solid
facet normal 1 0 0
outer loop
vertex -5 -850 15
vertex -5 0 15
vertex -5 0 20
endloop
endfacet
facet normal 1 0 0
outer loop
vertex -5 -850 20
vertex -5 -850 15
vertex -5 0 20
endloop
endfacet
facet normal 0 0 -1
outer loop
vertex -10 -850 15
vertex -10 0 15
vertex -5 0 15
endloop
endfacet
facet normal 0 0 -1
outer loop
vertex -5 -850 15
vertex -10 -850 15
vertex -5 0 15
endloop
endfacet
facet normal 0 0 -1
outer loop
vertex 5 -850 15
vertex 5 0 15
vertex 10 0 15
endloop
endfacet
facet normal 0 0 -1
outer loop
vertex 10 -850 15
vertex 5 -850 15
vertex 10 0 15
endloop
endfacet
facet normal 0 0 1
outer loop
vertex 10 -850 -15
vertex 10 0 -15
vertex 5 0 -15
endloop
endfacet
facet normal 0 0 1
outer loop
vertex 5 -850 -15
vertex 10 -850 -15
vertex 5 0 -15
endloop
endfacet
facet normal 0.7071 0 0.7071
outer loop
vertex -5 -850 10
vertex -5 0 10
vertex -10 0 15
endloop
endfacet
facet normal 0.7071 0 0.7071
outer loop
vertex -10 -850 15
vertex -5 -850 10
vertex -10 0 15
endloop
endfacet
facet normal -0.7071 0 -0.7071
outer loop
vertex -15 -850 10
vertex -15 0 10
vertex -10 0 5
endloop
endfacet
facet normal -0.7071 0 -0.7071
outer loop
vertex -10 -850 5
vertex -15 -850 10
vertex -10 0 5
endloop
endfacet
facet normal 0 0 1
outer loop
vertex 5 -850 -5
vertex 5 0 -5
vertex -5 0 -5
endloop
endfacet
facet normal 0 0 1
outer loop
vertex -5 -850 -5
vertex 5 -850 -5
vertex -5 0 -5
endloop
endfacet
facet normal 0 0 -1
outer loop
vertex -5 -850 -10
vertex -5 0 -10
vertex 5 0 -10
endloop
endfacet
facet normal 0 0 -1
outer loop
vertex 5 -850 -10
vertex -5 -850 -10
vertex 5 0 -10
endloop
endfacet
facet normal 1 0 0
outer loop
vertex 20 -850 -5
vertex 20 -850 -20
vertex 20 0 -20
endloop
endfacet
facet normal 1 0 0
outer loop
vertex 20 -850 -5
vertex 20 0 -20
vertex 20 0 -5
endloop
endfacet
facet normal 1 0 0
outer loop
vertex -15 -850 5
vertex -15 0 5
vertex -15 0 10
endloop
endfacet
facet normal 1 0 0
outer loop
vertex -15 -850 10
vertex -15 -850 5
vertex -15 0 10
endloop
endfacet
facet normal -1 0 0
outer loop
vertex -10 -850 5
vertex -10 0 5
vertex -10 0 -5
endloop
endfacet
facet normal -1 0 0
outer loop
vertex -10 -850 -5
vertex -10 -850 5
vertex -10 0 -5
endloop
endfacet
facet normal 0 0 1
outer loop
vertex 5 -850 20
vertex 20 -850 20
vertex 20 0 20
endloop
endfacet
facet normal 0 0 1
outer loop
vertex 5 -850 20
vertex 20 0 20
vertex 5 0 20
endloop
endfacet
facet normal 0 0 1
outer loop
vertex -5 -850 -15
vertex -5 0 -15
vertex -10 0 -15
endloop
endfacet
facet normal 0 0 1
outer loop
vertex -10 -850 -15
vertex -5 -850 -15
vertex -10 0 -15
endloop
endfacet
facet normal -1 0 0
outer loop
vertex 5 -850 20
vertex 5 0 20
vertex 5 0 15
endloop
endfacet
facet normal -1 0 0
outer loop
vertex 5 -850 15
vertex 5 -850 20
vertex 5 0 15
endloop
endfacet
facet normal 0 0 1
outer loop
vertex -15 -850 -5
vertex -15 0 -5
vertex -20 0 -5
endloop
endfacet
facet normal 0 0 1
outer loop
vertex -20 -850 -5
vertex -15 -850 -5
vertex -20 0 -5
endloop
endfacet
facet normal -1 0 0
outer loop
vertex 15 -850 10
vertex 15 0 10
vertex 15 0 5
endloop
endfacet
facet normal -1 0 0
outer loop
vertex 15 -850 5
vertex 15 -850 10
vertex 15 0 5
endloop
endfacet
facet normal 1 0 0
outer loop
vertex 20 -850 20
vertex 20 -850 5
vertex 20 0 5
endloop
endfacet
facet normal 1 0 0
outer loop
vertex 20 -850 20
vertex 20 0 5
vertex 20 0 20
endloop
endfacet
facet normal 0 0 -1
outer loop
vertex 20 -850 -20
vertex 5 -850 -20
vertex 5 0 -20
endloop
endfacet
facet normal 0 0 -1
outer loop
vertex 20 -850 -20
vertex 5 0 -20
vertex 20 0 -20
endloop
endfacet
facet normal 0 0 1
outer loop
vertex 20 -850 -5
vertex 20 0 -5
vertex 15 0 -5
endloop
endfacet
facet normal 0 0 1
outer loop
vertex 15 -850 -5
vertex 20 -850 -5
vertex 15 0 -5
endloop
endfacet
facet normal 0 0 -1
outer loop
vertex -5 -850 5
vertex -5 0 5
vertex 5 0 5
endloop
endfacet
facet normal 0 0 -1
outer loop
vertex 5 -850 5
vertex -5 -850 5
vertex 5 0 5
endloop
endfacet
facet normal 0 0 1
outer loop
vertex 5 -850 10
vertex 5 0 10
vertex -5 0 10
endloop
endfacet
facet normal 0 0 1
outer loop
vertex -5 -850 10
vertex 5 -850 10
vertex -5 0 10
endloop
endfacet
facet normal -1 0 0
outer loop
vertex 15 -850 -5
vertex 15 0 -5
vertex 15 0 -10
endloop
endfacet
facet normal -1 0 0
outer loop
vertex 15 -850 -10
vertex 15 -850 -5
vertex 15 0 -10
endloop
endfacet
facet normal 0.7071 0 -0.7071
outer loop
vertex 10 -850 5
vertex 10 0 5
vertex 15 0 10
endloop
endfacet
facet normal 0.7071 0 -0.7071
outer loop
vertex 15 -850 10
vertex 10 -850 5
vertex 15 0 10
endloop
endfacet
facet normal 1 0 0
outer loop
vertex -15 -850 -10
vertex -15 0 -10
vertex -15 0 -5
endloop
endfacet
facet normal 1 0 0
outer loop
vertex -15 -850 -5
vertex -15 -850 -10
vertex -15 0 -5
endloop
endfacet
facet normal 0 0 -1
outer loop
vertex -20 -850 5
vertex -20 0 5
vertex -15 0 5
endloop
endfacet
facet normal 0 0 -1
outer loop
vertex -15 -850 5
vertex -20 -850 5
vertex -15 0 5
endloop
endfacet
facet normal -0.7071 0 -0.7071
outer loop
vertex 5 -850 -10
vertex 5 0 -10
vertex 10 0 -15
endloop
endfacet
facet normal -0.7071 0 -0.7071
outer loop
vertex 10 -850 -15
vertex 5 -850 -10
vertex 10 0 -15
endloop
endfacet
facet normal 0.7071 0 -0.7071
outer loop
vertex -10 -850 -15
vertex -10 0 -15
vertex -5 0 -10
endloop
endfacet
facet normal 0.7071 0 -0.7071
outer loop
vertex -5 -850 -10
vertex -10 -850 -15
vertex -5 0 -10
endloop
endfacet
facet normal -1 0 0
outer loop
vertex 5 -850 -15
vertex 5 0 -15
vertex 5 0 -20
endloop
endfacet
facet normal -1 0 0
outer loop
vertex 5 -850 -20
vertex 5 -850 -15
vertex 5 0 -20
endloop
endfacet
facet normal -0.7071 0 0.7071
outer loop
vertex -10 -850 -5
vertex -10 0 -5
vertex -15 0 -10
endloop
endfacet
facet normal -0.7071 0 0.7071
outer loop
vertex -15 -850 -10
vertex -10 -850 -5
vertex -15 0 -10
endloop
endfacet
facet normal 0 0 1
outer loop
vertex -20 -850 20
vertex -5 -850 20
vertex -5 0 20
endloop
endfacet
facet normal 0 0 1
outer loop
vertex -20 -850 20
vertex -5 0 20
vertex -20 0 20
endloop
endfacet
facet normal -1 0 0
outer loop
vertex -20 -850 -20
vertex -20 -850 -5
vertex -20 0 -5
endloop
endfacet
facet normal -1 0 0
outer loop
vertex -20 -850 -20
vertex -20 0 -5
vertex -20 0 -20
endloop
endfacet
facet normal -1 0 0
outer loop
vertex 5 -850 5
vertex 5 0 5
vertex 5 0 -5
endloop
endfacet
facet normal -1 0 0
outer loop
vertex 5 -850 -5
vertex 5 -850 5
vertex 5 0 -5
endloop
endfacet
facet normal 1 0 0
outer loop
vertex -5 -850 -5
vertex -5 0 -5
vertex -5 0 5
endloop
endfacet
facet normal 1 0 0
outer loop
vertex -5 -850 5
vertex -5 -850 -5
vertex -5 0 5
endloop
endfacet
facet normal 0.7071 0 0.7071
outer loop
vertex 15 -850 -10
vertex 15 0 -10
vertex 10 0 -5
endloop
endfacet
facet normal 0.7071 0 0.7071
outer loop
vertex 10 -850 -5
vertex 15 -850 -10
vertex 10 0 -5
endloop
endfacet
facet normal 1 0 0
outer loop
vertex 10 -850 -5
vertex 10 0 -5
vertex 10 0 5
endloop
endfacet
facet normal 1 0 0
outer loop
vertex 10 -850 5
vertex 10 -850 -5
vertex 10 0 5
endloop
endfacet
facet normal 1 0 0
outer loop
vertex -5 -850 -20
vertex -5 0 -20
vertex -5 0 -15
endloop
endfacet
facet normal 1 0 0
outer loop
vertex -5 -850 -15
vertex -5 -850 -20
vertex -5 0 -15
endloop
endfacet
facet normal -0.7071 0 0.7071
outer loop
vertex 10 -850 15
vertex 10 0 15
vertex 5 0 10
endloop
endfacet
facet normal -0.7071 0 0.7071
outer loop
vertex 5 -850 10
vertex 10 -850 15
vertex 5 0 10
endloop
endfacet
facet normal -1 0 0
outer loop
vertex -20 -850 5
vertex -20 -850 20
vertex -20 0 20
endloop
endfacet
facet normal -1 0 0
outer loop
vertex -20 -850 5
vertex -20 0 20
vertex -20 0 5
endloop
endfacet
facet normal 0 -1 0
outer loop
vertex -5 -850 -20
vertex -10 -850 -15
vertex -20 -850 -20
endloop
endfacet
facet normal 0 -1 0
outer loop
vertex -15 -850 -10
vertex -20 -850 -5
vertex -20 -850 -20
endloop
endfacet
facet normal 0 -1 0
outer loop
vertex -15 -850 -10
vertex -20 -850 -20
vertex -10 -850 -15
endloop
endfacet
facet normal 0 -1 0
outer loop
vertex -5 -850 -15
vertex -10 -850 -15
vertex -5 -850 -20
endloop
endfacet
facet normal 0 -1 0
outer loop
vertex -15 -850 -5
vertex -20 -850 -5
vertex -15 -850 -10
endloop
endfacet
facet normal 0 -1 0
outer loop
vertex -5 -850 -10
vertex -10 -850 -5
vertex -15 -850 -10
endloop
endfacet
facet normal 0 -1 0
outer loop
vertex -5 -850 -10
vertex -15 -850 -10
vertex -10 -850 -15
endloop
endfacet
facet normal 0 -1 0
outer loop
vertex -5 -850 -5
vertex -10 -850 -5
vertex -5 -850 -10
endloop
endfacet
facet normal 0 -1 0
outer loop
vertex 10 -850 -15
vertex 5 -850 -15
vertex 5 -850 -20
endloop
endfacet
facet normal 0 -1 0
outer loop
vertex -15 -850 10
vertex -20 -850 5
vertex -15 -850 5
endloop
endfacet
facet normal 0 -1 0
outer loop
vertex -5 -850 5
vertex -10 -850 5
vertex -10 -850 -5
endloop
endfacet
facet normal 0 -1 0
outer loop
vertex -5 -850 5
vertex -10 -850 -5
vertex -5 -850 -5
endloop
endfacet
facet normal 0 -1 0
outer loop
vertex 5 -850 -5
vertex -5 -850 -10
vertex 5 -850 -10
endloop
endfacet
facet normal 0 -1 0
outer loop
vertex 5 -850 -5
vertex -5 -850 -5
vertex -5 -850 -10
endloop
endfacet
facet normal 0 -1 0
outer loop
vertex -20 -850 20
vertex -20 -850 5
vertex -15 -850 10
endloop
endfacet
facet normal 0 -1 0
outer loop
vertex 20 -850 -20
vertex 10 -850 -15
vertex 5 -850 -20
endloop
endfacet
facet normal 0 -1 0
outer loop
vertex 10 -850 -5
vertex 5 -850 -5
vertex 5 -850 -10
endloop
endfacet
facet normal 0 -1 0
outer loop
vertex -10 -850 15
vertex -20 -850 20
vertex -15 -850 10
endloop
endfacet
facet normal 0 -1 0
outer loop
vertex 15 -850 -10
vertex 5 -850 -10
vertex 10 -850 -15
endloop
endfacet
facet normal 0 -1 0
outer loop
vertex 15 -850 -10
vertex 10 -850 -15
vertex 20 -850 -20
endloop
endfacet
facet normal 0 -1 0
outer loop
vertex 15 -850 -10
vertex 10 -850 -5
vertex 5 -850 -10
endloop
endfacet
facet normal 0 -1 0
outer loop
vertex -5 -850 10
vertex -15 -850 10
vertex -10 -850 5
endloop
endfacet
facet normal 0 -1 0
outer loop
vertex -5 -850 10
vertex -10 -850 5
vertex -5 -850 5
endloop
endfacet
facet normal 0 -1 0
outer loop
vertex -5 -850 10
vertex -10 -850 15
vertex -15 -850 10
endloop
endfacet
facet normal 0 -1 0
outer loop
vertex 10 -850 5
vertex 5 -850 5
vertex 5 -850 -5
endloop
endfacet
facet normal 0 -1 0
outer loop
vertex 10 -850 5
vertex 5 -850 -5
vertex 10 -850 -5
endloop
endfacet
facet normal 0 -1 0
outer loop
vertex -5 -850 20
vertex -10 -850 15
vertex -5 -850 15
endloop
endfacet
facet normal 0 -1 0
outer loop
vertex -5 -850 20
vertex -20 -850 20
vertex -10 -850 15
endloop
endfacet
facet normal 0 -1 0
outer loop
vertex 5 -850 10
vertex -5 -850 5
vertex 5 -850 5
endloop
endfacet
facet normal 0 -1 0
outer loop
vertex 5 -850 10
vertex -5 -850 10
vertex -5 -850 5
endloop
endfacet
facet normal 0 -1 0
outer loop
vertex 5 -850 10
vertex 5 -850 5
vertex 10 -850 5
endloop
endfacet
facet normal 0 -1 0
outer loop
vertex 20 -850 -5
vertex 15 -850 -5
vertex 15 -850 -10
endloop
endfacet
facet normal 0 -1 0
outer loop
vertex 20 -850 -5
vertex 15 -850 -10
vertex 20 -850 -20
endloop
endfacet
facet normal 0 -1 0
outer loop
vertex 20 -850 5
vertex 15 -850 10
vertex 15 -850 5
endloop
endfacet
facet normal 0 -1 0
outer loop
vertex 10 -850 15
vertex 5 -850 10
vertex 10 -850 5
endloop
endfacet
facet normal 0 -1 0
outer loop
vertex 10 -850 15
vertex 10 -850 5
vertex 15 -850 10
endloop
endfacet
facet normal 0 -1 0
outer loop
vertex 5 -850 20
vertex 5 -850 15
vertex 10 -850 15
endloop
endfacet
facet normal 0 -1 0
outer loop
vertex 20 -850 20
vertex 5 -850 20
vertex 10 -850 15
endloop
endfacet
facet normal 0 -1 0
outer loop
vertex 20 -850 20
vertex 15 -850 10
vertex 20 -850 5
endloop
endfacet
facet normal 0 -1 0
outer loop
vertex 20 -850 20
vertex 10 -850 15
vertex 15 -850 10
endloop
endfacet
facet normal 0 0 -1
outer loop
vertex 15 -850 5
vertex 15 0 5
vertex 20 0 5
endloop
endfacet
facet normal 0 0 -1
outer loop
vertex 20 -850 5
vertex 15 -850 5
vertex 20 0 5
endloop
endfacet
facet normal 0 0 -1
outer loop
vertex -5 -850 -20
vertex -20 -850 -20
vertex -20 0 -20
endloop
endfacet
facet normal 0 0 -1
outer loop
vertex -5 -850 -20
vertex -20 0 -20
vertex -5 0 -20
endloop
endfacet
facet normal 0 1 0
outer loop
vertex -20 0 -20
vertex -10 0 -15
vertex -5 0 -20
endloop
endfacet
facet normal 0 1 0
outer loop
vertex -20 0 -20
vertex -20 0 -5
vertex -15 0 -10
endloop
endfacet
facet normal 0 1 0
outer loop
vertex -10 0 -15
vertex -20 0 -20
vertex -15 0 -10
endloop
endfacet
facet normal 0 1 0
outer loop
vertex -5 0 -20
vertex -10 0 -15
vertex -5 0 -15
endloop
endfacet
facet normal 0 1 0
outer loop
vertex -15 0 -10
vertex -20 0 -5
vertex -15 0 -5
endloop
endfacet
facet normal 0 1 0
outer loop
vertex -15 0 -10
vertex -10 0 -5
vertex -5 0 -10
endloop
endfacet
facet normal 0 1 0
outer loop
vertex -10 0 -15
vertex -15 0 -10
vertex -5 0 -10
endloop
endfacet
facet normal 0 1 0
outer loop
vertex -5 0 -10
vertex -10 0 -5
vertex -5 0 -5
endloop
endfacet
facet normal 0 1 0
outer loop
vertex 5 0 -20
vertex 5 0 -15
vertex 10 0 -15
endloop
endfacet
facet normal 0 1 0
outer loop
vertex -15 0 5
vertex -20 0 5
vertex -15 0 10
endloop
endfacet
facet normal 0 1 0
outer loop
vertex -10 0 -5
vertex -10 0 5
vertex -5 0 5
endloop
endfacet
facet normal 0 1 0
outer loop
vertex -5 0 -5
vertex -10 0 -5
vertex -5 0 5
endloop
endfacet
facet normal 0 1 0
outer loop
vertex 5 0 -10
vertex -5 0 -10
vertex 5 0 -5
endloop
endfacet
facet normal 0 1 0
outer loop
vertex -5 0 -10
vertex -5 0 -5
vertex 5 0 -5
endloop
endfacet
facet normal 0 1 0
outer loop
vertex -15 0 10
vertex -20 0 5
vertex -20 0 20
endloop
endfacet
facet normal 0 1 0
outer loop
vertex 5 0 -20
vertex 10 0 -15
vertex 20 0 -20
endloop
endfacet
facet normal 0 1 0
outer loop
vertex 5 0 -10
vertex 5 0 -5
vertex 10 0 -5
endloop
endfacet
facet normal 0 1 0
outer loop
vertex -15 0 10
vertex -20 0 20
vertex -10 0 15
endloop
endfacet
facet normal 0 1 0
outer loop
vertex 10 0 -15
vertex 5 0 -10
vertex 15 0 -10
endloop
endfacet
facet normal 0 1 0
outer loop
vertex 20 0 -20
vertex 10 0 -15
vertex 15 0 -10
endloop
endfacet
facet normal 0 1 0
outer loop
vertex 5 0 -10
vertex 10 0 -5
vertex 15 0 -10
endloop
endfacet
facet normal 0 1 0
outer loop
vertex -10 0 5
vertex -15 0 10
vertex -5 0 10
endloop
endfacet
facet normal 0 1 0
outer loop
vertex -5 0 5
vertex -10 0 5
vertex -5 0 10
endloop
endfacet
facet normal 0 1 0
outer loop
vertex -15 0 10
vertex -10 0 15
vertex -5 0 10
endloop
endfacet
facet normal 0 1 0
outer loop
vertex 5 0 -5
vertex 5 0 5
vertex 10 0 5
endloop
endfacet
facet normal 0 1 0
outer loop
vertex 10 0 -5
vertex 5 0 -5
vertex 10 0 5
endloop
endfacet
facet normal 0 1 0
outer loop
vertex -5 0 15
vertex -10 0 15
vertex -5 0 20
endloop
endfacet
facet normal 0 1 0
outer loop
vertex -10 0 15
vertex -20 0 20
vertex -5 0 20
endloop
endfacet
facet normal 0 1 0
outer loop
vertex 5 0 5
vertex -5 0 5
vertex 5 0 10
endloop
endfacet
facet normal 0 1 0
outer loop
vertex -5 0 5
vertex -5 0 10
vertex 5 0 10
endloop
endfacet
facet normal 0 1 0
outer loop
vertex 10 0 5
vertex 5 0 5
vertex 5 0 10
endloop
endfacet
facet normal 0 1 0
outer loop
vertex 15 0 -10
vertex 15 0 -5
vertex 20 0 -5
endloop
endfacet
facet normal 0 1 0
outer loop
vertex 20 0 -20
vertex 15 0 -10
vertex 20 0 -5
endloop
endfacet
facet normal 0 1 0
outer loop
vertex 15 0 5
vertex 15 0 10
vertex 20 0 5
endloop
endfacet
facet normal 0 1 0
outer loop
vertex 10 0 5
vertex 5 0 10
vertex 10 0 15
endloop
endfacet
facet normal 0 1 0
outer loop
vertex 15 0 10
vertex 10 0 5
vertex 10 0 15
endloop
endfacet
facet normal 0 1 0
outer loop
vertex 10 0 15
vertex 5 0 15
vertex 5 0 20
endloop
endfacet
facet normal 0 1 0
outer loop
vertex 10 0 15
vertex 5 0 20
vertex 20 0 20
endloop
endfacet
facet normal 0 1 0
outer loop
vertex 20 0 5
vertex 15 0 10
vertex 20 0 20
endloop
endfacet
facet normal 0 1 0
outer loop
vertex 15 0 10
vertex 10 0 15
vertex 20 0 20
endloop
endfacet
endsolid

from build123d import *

# Parameters (mm, degrees)
F1_DEPTH = 850


with BuildPart() as f1:
    # F0 (on Front) → F1 (new body)
    with BuildSketch(Plane.XZ):
        Polygon((20, 5), (20, 20), (5, 20), (5, 15), (10, 15), (5, 10), (-5, 10), (-10, 15), (-5, 15), (-5, 20), (-20, 20), (-20, 5), (-15, 5), (-15, 10), (-10, 5), (-10, -5), (-15, -10), (-15, -5), (-20, -5), (-20, -20), (-5, -20), (-5, -15), (-10, -15), (-5, -10), (5, -10), (10, -15), (5, -15), (5, -20), (20, -20), (20, -5), (15, -5), (15, -10), (10, -5), (10, 5), (15, 10), (15, 5), align=None)
        Polygon((-5, 0), (-5, 5), (0, 5), (5, 5), (5, 0), (5, -5), (0, -5), (-5, -5), align=None, mode=Mode.SUBTRACT)
    extrude(amount=F1_DEPTH)


solid = f1.part
